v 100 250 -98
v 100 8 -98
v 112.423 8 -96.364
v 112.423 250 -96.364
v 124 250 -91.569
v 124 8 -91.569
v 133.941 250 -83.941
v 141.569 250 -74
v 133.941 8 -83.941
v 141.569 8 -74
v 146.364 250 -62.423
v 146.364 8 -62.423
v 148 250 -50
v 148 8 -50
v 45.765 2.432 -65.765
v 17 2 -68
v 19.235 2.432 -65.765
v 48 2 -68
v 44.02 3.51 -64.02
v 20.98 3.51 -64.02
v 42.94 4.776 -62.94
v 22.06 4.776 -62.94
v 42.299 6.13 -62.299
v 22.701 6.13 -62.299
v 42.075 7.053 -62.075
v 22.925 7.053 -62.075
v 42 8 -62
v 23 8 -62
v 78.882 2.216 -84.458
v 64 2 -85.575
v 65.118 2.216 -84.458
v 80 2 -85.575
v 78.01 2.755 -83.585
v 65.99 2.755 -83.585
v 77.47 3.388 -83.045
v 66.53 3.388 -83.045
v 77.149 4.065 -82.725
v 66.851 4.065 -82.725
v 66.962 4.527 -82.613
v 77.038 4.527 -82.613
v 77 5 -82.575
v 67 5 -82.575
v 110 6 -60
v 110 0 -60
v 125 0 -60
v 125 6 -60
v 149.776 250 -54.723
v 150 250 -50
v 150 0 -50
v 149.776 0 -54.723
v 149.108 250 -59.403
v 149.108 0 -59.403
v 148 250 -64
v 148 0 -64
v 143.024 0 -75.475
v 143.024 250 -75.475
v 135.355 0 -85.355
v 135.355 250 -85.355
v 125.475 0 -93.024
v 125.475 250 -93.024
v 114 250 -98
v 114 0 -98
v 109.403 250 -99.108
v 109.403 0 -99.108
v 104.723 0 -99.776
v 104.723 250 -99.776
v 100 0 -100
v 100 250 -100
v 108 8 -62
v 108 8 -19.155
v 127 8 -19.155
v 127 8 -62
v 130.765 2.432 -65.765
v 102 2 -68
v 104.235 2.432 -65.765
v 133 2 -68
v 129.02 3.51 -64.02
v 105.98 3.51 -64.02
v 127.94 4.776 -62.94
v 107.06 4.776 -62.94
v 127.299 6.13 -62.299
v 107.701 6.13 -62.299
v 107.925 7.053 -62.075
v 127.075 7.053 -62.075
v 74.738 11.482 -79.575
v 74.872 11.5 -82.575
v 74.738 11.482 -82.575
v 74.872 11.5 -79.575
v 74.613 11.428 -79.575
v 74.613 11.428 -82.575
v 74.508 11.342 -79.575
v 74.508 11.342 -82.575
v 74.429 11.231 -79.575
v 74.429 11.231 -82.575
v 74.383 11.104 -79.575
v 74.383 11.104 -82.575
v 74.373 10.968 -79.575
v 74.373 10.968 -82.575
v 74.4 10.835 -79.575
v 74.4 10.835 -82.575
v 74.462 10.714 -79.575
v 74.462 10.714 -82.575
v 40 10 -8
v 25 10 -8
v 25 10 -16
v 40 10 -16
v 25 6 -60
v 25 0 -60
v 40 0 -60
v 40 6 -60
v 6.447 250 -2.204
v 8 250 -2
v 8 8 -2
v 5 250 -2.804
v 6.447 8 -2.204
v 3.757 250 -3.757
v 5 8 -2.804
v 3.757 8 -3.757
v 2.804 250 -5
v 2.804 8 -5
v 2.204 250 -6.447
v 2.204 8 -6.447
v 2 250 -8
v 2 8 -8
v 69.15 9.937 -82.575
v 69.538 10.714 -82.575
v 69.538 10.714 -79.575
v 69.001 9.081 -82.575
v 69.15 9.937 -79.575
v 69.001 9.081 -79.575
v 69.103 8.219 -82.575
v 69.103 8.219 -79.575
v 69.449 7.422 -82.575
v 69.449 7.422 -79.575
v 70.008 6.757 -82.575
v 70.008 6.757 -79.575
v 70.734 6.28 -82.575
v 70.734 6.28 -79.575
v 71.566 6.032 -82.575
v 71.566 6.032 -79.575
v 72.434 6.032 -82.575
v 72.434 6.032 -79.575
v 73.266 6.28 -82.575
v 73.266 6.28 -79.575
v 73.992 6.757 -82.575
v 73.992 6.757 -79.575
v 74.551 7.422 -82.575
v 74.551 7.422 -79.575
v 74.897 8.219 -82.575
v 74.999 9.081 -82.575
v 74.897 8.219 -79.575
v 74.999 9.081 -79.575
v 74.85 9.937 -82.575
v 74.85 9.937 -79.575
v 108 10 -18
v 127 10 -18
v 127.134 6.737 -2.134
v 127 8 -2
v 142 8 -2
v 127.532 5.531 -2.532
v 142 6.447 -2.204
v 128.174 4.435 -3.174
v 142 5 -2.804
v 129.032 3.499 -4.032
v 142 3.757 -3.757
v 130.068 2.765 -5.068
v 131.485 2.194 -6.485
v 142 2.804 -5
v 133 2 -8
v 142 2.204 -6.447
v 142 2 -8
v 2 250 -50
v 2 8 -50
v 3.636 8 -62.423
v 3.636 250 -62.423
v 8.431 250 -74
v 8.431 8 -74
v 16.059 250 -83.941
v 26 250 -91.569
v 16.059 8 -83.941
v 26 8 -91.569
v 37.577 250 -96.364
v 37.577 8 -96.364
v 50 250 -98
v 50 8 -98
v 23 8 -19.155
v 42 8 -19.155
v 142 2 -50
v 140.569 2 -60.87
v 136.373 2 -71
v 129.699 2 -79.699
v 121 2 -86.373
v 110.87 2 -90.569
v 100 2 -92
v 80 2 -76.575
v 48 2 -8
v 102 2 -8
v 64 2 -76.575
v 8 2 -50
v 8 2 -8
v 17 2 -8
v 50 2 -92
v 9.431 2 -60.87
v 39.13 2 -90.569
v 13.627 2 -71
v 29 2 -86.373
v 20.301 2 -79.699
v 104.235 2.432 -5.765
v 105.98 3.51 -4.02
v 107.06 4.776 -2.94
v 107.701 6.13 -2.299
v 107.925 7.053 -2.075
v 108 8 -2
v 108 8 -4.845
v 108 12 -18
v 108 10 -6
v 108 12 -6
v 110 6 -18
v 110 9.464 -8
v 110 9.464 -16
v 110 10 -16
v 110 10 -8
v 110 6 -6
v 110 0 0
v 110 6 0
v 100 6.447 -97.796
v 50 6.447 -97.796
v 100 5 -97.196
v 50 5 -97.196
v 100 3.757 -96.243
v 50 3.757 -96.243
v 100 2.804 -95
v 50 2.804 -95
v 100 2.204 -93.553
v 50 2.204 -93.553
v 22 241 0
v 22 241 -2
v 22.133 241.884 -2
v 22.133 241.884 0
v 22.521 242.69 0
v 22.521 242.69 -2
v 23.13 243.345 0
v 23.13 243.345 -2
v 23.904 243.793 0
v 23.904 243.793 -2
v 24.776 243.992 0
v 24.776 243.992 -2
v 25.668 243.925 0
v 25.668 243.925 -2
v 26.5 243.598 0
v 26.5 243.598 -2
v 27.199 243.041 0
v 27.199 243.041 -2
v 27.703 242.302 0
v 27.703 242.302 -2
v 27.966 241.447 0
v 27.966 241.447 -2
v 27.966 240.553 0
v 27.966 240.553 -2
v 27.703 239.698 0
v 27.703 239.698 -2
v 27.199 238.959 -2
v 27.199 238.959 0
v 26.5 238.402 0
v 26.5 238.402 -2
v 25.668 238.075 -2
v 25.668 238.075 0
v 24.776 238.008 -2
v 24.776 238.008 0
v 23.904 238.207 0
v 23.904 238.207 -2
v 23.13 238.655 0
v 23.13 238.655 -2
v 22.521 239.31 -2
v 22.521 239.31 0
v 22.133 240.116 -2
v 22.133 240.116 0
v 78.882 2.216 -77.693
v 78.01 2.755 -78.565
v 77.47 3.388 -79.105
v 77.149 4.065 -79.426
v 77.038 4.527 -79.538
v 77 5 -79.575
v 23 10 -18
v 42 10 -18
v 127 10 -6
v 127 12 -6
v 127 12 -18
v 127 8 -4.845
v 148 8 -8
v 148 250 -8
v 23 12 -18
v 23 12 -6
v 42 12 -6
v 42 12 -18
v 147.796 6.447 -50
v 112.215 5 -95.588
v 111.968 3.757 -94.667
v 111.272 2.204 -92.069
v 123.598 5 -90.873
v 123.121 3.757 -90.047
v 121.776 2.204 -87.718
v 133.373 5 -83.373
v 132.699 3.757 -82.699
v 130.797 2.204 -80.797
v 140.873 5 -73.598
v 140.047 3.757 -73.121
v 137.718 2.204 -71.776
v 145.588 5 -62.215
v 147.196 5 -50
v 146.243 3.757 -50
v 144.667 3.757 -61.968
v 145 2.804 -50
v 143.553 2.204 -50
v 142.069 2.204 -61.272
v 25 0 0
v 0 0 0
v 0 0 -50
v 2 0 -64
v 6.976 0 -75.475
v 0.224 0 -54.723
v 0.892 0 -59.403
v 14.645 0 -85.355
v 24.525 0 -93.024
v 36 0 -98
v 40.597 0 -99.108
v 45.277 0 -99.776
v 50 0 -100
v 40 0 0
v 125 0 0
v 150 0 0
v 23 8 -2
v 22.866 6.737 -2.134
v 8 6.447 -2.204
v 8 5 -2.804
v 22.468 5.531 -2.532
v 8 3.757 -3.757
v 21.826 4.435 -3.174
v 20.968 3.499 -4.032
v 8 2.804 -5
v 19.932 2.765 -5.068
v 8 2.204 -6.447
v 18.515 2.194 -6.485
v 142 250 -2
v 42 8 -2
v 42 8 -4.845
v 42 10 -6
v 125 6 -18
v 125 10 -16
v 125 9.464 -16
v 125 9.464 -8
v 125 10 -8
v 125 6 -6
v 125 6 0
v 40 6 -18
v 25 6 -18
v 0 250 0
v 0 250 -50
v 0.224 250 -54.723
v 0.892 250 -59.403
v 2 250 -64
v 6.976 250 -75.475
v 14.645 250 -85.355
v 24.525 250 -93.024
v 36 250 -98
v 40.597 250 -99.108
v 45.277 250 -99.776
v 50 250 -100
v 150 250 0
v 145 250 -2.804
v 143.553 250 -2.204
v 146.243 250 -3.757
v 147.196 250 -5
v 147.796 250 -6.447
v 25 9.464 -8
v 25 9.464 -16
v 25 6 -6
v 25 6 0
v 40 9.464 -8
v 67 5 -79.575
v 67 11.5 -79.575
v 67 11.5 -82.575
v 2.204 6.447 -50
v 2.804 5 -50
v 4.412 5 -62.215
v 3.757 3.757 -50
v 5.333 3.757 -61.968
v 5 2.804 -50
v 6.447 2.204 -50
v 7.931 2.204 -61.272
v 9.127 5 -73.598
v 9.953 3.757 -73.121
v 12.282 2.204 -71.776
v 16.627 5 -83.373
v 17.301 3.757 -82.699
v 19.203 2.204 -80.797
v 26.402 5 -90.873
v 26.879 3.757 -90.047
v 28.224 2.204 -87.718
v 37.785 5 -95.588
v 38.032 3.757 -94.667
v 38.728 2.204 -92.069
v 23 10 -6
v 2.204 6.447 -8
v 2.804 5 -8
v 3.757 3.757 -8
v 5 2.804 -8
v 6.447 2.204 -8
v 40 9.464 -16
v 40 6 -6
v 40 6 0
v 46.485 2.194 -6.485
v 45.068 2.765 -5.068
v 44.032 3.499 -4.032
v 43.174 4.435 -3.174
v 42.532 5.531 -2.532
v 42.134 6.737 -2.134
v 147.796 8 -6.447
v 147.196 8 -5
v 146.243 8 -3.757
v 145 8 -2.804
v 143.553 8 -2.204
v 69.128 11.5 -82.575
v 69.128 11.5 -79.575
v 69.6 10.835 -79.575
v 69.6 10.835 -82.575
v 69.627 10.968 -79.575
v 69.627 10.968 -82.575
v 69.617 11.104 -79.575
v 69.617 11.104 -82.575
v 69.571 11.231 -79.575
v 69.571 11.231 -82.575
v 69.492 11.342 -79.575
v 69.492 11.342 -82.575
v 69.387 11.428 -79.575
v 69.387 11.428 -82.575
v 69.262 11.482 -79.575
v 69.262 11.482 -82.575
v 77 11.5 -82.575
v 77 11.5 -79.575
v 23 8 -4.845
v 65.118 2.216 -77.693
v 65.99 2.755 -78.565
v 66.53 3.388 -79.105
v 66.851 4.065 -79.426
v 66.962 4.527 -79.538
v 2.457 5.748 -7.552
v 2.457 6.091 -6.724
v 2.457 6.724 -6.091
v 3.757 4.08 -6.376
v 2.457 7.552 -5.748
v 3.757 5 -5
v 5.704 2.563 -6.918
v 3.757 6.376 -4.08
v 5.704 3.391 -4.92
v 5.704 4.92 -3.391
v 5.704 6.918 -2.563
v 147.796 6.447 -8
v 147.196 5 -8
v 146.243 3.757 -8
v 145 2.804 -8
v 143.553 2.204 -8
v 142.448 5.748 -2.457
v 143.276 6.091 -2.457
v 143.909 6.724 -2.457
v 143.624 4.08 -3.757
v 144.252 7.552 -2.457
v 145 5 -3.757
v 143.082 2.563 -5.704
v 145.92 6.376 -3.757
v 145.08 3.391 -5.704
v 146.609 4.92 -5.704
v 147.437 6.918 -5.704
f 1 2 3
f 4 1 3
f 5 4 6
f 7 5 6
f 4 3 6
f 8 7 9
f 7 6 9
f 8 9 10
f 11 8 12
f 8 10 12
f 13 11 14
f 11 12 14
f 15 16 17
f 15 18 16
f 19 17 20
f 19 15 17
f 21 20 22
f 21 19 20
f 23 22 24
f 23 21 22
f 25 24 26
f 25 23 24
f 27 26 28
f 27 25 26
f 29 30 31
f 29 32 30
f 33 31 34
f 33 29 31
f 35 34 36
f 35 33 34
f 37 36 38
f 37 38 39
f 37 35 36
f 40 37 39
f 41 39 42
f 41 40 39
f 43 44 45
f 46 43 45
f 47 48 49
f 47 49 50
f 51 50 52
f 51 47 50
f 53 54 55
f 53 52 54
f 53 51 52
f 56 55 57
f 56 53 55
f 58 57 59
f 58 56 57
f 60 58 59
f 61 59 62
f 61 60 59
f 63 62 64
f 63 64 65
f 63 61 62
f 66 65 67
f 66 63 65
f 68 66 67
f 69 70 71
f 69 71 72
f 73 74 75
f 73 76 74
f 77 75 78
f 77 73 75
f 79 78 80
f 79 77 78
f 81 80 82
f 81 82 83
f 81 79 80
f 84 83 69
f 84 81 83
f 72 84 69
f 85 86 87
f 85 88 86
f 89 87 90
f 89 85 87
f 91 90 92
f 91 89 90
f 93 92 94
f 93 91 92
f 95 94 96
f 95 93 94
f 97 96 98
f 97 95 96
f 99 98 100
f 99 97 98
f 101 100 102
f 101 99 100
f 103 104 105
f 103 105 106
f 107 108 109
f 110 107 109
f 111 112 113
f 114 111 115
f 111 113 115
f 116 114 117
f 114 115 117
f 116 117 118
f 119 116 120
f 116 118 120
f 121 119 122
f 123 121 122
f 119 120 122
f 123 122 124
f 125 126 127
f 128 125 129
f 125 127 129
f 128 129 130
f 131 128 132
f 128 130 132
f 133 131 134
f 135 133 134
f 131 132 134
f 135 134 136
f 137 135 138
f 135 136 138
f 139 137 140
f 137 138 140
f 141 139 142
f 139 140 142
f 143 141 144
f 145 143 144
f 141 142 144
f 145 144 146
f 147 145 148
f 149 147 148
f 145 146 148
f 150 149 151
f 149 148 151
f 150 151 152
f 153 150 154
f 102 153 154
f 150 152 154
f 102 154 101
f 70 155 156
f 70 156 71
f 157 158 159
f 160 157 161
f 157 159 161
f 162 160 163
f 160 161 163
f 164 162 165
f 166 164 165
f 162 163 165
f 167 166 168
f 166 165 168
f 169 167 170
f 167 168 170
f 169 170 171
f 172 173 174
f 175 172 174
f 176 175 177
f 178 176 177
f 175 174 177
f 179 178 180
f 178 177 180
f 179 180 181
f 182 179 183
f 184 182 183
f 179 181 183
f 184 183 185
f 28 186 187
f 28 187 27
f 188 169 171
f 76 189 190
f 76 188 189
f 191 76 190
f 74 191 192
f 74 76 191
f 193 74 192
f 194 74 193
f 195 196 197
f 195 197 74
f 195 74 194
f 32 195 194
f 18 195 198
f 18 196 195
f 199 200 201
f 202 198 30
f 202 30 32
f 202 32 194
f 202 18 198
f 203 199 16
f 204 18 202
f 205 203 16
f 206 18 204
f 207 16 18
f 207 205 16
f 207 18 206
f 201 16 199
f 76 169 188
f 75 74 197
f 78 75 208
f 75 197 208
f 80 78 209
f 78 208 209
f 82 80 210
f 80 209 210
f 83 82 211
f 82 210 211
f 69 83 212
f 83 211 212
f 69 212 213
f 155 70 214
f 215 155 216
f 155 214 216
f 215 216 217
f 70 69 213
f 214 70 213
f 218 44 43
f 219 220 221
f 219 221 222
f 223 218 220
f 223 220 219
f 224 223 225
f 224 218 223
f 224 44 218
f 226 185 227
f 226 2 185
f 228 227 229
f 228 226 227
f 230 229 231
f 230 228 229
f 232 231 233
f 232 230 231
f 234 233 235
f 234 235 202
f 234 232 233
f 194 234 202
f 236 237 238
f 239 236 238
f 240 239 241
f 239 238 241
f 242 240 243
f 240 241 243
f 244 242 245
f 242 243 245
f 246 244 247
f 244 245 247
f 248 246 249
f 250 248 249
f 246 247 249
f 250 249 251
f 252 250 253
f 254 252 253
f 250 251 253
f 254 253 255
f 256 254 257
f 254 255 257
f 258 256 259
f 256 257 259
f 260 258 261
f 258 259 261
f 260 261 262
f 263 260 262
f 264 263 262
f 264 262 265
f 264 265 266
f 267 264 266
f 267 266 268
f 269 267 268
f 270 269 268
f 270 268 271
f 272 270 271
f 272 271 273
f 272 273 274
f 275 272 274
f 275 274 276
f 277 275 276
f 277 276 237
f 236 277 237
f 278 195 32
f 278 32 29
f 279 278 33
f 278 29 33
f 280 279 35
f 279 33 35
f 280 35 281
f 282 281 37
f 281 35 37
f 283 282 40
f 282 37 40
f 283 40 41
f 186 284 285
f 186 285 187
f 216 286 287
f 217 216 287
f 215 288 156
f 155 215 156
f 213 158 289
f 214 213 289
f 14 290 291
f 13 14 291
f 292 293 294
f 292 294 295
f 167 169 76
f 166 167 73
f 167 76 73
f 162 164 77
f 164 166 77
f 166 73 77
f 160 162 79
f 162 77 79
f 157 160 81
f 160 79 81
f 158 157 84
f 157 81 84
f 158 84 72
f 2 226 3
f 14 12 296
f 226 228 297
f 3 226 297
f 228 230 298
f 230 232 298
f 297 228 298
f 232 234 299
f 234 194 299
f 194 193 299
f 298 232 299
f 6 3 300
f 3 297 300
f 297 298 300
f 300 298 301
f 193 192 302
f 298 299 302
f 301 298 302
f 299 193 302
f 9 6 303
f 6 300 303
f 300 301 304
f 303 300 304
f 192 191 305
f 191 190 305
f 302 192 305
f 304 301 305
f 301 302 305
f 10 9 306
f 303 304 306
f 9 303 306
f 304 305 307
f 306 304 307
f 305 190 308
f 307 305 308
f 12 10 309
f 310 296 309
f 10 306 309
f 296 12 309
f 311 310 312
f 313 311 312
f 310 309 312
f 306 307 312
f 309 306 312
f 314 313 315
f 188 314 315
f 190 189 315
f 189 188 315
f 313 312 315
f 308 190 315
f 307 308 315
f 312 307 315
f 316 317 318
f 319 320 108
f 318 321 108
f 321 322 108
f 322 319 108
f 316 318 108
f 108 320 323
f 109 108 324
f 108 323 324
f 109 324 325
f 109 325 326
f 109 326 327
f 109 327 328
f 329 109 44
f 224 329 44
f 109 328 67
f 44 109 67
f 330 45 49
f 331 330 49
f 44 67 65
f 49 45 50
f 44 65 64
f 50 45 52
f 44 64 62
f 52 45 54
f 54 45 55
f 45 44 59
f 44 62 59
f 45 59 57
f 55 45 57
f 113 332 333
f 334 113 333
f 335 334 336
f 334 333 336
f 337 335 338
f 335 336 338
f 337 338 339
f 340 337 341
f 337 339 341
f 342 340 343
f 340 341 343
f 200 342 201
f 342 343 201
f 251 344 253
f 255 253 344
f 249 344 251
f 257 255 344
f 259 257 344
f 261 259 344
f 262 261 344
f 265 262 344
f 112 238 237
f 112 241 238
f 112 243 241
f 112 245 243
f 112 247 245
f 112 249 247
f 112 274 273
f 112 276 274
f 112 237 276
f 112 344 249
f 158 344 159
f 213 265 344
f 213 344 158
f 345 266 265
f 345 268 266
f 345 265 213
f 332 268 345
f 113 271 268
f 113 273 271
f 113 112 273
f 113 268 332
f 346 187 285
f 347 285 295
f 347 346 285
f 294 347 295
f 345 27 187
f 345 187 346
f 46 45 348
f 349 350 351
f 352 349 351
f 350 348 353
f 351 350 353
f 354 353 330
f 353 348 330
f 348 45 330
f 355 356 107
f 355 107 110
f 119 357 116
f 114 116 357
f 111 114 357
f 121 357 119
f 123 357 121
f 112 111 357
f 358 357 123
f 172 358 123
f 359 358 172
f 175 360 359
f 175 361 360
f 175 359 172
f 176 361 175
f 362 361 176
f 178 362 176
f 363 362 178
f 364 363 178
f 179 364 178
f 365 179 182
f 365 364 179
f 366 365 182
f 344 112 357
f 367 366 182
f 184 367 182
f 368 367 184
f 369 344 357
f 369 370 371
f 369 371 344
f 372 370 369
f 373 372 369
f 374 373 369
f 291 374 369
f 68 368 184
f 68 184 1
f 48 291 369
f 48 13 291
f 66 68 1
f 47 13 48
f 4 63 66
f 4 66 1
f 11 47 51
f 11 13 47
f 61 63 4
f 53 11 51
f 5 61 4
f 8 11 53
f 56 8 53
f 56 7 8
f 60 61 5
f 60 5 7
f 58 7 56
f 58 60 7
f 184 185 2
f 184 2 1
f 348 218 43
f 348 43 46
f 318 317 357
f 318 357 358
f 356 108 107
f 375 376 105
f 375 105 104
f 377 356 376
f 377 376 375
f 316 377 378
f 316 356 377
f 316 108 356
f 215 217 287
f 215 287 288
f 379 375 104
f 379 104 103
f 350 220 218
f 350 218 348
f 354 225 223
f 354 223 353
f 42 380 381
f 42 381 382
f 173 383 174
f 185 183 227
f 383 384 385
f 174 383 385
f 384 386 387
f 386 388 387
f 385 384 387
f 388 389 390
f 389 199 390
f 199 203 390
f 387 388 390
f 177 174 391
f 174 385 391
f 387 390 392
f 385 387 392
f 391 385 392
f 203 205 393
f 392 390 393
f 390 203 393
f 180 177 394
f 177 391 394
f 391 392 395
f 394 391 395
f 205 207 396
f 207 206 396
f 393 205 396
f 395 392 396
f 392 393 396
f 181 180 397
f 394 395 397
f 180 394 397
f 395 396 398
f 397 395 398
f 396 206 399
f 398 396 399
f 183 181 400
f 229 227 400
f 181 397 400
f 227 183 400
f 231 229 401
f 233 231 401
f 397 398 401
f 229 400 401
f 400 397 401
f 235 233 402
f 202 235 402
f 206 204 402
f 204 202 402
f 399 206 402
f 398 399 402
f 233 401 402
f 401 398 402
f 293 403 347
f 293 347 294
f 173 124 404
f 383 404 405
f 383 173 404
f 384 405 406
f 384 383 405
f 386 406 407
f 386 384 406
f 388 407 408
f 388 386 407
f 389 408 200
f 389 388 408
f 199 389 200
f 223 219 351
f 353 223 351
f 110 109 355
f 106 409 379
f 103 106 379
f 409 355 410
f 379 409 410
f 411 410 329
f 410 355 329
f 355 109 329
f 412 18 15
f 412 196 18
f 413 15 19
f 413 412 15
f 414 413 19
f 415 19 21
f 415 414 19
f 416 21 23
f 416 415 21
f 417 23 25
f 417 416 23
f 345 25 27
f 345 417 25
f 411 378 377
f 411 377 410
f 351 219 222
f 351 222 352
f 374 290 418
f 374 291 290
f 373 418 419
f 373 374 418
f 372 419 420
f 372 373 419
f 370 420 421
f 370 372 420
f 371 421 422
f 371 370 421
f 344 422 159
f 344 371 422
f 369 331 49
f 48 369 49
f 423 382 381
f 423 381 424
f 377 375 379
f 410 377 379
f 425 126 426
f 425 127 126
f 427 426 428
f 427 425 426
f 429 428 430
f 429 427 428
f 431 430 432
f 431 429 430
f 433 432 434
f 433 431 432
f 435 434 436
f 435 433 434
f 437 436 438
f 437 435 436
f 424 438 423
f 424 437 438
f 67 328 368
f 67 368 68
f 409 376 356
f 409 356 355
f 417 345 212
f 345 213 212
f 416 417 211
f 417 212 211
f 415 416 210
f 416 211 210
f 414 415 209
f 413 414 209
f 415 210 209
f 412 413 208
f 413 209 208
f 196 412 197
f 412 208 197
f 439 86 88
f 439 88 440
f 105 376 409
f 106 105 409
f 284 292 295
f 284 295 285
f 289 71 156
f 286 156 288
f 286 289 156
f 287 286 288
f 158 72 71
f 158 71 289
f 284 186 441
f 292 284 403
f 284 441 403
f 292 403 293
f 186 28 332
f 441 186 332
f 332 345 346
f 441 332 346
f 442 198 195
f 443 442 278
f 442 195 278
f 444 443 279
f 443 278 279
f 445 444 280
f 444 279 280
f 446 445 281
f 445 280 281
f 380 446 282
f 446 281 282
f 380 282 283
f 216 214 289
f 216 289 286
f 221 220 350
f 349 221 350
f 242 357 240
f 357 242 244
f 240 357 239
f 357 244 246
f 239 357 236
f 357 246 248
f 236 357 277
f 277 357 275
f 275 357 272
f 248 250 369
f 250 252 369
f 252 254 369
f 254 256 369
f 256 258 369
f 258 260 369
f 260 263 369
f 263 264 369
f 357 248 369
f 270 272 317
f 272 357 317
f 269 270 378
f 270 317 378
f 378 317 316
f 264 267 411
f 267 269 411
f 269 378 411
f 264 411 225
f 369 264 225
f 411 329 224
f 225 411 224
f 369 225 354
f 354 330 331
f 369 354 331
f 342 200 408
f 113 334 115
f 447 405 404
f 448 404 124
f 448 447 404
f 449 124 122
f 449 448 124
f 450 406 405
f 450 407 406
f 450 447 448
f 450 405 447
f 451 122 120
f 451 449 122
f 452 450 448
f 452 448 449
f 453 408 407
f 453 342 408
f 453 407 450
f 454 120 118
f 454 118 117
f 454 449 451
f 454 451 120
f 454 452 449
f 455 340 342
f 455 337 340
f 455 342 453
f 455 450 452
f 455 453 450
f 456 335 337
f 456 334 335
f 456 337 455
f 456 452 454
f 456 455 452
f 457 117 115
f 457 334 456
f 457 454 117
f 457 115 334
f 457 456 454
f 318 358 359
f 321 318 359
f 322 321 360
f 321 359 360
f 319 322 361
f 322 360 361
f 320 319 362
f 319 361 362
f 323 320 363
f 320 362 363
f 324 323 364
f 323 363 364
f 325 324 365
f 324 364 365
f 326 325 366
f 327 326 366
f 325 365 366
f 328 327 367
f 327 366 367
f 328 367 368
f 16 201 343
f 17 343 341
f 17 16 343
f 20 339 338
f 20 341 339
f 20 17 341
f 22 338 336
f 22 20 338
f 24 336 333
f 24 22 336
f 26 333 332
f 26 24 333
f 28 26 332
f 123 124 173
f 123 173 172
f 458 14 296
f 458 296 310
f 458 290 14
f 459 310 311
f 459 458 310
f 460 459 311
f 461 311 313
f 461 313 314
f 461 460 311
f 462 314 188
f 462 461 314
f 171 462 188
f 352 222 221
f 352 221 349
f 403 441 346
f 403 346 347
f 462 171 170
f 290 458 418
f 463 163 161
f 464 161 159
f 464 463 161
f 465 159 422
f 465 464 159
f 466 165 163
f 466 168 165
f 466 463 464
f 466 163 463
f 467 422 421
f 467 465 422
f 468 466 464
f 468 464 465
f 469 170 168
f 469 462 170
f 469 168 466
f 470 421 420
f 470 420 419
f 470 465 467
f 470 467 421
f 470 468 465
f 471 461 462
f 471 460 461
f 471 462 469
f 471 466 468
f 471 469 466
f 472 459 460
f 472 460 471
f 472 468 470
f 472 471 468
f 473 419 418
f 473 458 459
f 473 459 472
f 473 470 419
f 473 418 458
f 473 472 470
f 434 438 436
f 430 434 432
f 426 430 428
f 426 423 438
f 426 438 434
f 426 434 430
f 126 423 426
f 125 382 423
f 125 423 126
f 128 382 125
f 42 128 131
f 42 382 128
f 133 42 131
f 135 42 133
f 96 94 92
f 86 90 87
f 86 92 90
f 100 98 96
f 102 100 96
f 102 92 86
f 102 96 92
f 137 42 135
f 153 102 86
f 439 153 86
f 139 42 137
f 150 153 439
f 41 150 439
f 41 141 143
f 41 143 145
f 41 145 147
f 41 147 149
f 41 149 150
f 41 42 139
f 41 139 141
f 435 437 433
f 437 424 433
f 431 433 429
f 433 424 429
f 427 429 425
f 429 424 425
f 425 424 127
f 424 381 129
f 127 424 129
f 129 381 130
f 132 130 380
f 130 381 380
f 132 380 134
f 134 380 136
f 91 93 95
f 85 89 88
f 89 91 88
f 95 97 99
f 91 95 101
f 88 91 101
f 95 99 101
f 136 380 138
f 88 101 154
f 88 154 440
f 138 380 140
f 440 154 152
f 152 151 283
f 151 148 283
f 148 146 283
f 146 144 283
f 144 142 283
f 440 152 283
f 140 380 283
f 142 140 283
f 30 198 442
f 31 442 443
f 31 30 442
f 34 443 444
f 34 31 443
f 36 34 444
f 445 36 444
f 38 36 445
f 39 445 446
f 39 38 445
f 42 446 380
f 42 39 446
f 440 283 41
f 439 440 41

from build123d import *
from OCP.BRepFilletAPI import BRepFilletAPI_MakeChamfer

# Parameters (mm, degrees)
SKETCH1_W           = 150
SKETCH1_H           = 100
BOSS_EXTRUDE1_DEPTH = 250
FILLET1_R           = 50
SKETCH4_W           = 15
SKETCH4_H           = 60
CUT_EXTRUDE2_DEPTH  = 6
SKETCH5_W           = 15
SKETCH5_H           = 8
CUT_EXTRUDE3_DEPTH  = 4
CHAMFER2_SIZE       = 2
CHAMFER2_SIZE2      = 3.464101615
SHELL1_START        = 42
SHELL1_OUTLINE_W    = 248
SHELL1_OUTLINE_H    = 96
SHELL1_DEPTH        = 66
SHELL1_START_2      = 2
SHELL1_2_DEPTH      = 40
SHELL1_START_3      = 108
SHELL1_3_DEPTH      = 40
SHELL1_4_DEPTH      = 21
SHELL1_START_4      = 127
SHELL1_5_DEPTH      = 21
SHELL1_6_DEPTH      = 250
FILLET4_R           = 6
SKETCH6_W           = 10
SKETCH6_H           = 3
EXTRUDE_THIN1_DEPTH = 9.5
FILLET5_R           = 3
CUT_EXTRUDE4_REACH  = 304.212
SKETCH7_R           = 3
FILLET6_R           = 0.5
SKETCH8_R           = 3
CUT_EXTRUDE5_DEPTH  = 10


with BuildPart() as part:
    # Sketch1 → Boss-Extrude1 (new body)
    with BuildSketch(Plane(origin=(0, 0, 0), x_dir=(1, 0, 0), z_dir=(0, 1, 0))):
        with Locations((75, 50)):
            Rectangle(SKETCH1_W, SKETCH1_H)
    extrude(amount=BOSS_EXTRUDE1_DEPTH)

    # Fillet1
    fillet1_edges = [part.edges().sort_by_distance(p)[0] for p in [
        (0, 125, -100),
        (150, 125, -100),
    ]]
    fillet(fillet1_edges, radius=FILLET1_R)

    # Sketch4 → Cut-Extrude2 (cut)
    with BuildSketch(Plane.XZ):
        with Locations((32.5, -30)):
            Rectangle(SKETCH4_W, SKETCH4_H)
        with Locations((117.5, -30)):
            Rectangle(SKETCH4_W, SKETCH4_H)
    extrude(amount=-CUT_EXTRUDE2_DEPTH, mode=Mode.SUBTRACT)

    # Sketch5 → Cut-Extrude3 (cut)
    with BuildSketch(Plane.XZ.offset(-6)):
        with Locations((32.5, -12)):
            Rectangle(SKETCH5_W, SKETCH5_H)
        with Locations((117.5, -12)):
            Rectangle(SKETCH5_W, SKETCH5_H)
    extrude(amount=-CUT_EXTRUDE3_DEPTH, mode=Mode.SUBTRACT)

    # Chamfer2: one chamfer whose edges measure the first distance from different faces: ONE call of the kernel's chamfer builder (chamfer() names one face for all edges)
    chamfer2_edges_1 = [part.edges().sort_by_distance(p)[0] for p in [
        (32.5, 6, -16),
    ]]
    chamfer2_side_1 = [part.faces().sort_by_distance(p)[0] for p in [
        (32.5, 6, -38),
    ]]
    chamfer2_edges_2 = [part.edges().sort_by_distance(p)[0] for p in [
        (32.5, 6, -8),
    ]]
    chamfer2_side_2 = [part.faces().sort_by_distance(p)[0] for p in [
        (32.5, 6, -4),
    ]]
    chamfer2_edges_3 = [part.edges().sort_by_distance(p)[0] for p in [
        (117.5, 6, -16),
    ]]
    chamfer2_side_3 = [part.faces().sort_by_distance(p)[0] for p in [
        (117.5, 6, -38),
    ]]
    chamfer2_edges_4 = [part.edges().sort_by_distance(p)[0] for p in [
        (117.5, 6, -8),
    ]]
    chamfer2_side_4 = [part.faces().sort_by_distance(p)[0] for p in [
        (117.5, 6, -4),
    ]]
    chamfer2 = BRepFilletAPI_MakeChamfer(part.part.solid().wrapped)
    for e in chamfer2_edges_1:
        chamfer2.Add(CHAMFER2_SIZE, CHAMFER2_SIZE2, e.wrapped, chamfer2_side_1[0].wrapped)  # the first distance lies on this face
    for e in chamfer2_edges_2:
        chamfer2.Add(CHAMFER2_SIZE, CHAMFER2_SIZE2, e.wrapped, chamfer2_side_2[0].wrapped)  # the first distance lies on this face
    for e in chamfer2_edges_3:
        chamfer2.Add(CHAMFER2_SIZE, CHAMFER2_SIZE2, e.wrapped, chamfer2_side_3[0].wrapped)  # the first distance lies on this face
    for e in chamfer2_edges_4:
        chamfer2.Add(CHAMFER2_SIZE, CHAMFER2_SIZE2, e.wrapped, chamfer2_side_4[0].wrapped)  # the first distance lies on this face
    add(Compound.cast(chamfer2.Shape()), mode=Mode.REPLACE)

    # Shell1: read off the stored shape, not the designer's step
    # Shell1 outline → Shell1 (cut)
    with BuildSketch(Plane.YZ.offset(SHELL1_START)):
        with Locations((126, -50)):
            Rectangle(SHELL1_OUTLINE_W, SHELL1_OUTLINE_H)
    extrude(amount=SHELL1_DEPTH, mode=Mode.SUBTRACT)

    # Shell1 2 outline → Shell1 2 (cut)
    with BuildSketch(Plane.YZ.offset(SHELL1_START_2)):
        Polygon((8, -2), (8, -4.845299462), (10, -6), (12, -6), (12, -18), (10, -18), (8, -19.154700538), (8, -62), (2, -62), (2, -98), (250, -98), (250, -2), align=None)
    extrude(amount=SHELL1_2_DEPTH, mode=Mode.SUBTRACT)

    # Shell1 3 outline → Shell1 3 (cut)
    with BuildSketch(Plane.YZ.offset(SHELL1_START_3)):
        Polygon((8, -2), (8, -4.845299462), (10, -6), (12, -6), (12, -18), (10, -18), (8, -19.154700538), (8, -62), (2, -62), (2, -98), (250, -98), (250, -2), align=None)
    extrude(amount=SHELL1_3_DEPTH, mode=Mode.SUBTRACT)

    # Shell1 4 outline → Shell1 4 (cut)
    with BuildSketch(Plane.YZ.offset(SHELL1_START_2)):
        Polygon((10, -6), (8, -4.845299462), (8, -2), (2, -2), (2, -62), (8, -62), (8, -19.154700538), (10, -18), (12, -18), (12, -6), align=None)
    extrude(amount=SHELL1_4_DEPTH, mode=Mode.SUBTRACT)

    # Shell1 5 outline → Shell1 5 (cut)
    with BuildSketch(Plane.YZ.offset(SHELL1_START_4)):
        Polygon((10, -6), (8, -4.845299462), (8, -2), (2, -2), (2, -62), (8, -62), (8, -19.154700538), (10, -18), (12, -18), (12, -6), align=None)
    extrude(amount=SHELL1_5_DEPTH, mode=Mode.SUBTRACT)

    # Shell1 6 outline → Shell1 6 (add)
    with BuildSketch(Plane(origin=(0, 0, 0), x_dir=(1, 0, 0), z_dir=(0, 1, 0))):
        with BuildLine():
            Line((114, 98), (100, 98))
            ThreePointArc((100, 98), (133.941125497, 83.941125497), (148, 50))
            Line((148, 50), (148, 64))
            ThreePointArc((148, 64), (135.355339059, 85.355339059), (114, 98))
        make_face()
        with BuildLine():
            ThreePointArc((36, 98), (14.644660941, 85.355339059), (2, 64))
            Line((2, 64), (2, 50))
            ThreePointArc((2, 50), (16.058874503, 83.941125497), (50, 98))
            Line((50, 98), (36, 98))
        make_face()
    extrude(amount=SHELL1_6_DEPTH)

    # Fillet4
    fillet4_edges = [part.edges().sort_by_distance(p)[0] for p in [
        (12.5, 2, -2),
        (2, 2, -26),
        (16.058874503, 2, -83.941125497),
        (75, 2, -98),
        (133.941125497, 2, -83.941125497),
        (148, 2, -26),
        (137.5, 2, -2),
        (108, 2, -32),
        (127, 2, -32),
        (117.5, 2, -62),
        (75, 2, -2),
        (23, 2, -32),
        (42, 2, -32),
        (32.5, 2, -62),
        (2, 126, -2),
        (148, 126, -2),
    ]]
    fillet(fillet4_edges, radius=FILLET4_R - 0.0001)  # a hair under: the kernel refuses the full size

    # Sketch6 → Extrude-Thin1 (add)
    with BuildSketch(Plane(origin=(0, 2, 0), x_dir=(1, 0, 0), z_dir=(0, 1, 0))):
        with Locations((72, 81.075172512)):
            Rectangle(SKETCH6_W, SKETCH6_H)
    extrude(amount=EXTRUDE_THIN1_DEPTH)

    # Fillet5
    fillet5_edges = [part.edges().sort_by_distance(p)[0] for p in [
        (72, 2, -79.575172512),
        (67, 2, -81.075172512),
        (72, 2, -82.575172512),
        (77, 2, -81.075172512),
    ]]
    fillet(fillet5_edges, radius=FILLET5_R)

    # Sketch7 → Cut-Extrude4 (cut, up to next)
    with BuildSketch(Plane.XY.offset(-79.575172512), mode=Mode.PRIVATE) as cut_extrude4_sk1:
        with Locations((72, 9)):
            Circle(SKETCH7_R)
    cut_extrude4_tool1 = extrude(cut_extrude4_sk1.sketch, amount=-CUT_EXTRUDE4_REACH, mode=Mode.PRIVATE) & part.part
    add(cut_extrude4_tool1.solids().sort_by_distance((72, 9, -79.575173))[0], mode=Mode.SUBTRACT)

    # Fillet6
    fillet6_edges = [part.edges().sort_by_distance(p)[0] for p in [
        (73.658312395, 11.5, -81.075172512),
        (70.341687605, 11.5, -81.075172512),
    ]]
    fillet(fillet6_edges, radius=FILLET6_R)

    # Sketch8 → Cut-Extrude5 (cut)
    with BuildSketch(Plane(origin=(0, 0, -2), x_dir=(-1, 0, 0), z_dir=(0, 0, -1))):
        with Locations((-25, 241)):
            Circle(SKETCH8_R)
    extrude(amount=-CUT_EXTRUDE5_DEPTH, mode=Mode.SUBTRACT)


solid = part.part
